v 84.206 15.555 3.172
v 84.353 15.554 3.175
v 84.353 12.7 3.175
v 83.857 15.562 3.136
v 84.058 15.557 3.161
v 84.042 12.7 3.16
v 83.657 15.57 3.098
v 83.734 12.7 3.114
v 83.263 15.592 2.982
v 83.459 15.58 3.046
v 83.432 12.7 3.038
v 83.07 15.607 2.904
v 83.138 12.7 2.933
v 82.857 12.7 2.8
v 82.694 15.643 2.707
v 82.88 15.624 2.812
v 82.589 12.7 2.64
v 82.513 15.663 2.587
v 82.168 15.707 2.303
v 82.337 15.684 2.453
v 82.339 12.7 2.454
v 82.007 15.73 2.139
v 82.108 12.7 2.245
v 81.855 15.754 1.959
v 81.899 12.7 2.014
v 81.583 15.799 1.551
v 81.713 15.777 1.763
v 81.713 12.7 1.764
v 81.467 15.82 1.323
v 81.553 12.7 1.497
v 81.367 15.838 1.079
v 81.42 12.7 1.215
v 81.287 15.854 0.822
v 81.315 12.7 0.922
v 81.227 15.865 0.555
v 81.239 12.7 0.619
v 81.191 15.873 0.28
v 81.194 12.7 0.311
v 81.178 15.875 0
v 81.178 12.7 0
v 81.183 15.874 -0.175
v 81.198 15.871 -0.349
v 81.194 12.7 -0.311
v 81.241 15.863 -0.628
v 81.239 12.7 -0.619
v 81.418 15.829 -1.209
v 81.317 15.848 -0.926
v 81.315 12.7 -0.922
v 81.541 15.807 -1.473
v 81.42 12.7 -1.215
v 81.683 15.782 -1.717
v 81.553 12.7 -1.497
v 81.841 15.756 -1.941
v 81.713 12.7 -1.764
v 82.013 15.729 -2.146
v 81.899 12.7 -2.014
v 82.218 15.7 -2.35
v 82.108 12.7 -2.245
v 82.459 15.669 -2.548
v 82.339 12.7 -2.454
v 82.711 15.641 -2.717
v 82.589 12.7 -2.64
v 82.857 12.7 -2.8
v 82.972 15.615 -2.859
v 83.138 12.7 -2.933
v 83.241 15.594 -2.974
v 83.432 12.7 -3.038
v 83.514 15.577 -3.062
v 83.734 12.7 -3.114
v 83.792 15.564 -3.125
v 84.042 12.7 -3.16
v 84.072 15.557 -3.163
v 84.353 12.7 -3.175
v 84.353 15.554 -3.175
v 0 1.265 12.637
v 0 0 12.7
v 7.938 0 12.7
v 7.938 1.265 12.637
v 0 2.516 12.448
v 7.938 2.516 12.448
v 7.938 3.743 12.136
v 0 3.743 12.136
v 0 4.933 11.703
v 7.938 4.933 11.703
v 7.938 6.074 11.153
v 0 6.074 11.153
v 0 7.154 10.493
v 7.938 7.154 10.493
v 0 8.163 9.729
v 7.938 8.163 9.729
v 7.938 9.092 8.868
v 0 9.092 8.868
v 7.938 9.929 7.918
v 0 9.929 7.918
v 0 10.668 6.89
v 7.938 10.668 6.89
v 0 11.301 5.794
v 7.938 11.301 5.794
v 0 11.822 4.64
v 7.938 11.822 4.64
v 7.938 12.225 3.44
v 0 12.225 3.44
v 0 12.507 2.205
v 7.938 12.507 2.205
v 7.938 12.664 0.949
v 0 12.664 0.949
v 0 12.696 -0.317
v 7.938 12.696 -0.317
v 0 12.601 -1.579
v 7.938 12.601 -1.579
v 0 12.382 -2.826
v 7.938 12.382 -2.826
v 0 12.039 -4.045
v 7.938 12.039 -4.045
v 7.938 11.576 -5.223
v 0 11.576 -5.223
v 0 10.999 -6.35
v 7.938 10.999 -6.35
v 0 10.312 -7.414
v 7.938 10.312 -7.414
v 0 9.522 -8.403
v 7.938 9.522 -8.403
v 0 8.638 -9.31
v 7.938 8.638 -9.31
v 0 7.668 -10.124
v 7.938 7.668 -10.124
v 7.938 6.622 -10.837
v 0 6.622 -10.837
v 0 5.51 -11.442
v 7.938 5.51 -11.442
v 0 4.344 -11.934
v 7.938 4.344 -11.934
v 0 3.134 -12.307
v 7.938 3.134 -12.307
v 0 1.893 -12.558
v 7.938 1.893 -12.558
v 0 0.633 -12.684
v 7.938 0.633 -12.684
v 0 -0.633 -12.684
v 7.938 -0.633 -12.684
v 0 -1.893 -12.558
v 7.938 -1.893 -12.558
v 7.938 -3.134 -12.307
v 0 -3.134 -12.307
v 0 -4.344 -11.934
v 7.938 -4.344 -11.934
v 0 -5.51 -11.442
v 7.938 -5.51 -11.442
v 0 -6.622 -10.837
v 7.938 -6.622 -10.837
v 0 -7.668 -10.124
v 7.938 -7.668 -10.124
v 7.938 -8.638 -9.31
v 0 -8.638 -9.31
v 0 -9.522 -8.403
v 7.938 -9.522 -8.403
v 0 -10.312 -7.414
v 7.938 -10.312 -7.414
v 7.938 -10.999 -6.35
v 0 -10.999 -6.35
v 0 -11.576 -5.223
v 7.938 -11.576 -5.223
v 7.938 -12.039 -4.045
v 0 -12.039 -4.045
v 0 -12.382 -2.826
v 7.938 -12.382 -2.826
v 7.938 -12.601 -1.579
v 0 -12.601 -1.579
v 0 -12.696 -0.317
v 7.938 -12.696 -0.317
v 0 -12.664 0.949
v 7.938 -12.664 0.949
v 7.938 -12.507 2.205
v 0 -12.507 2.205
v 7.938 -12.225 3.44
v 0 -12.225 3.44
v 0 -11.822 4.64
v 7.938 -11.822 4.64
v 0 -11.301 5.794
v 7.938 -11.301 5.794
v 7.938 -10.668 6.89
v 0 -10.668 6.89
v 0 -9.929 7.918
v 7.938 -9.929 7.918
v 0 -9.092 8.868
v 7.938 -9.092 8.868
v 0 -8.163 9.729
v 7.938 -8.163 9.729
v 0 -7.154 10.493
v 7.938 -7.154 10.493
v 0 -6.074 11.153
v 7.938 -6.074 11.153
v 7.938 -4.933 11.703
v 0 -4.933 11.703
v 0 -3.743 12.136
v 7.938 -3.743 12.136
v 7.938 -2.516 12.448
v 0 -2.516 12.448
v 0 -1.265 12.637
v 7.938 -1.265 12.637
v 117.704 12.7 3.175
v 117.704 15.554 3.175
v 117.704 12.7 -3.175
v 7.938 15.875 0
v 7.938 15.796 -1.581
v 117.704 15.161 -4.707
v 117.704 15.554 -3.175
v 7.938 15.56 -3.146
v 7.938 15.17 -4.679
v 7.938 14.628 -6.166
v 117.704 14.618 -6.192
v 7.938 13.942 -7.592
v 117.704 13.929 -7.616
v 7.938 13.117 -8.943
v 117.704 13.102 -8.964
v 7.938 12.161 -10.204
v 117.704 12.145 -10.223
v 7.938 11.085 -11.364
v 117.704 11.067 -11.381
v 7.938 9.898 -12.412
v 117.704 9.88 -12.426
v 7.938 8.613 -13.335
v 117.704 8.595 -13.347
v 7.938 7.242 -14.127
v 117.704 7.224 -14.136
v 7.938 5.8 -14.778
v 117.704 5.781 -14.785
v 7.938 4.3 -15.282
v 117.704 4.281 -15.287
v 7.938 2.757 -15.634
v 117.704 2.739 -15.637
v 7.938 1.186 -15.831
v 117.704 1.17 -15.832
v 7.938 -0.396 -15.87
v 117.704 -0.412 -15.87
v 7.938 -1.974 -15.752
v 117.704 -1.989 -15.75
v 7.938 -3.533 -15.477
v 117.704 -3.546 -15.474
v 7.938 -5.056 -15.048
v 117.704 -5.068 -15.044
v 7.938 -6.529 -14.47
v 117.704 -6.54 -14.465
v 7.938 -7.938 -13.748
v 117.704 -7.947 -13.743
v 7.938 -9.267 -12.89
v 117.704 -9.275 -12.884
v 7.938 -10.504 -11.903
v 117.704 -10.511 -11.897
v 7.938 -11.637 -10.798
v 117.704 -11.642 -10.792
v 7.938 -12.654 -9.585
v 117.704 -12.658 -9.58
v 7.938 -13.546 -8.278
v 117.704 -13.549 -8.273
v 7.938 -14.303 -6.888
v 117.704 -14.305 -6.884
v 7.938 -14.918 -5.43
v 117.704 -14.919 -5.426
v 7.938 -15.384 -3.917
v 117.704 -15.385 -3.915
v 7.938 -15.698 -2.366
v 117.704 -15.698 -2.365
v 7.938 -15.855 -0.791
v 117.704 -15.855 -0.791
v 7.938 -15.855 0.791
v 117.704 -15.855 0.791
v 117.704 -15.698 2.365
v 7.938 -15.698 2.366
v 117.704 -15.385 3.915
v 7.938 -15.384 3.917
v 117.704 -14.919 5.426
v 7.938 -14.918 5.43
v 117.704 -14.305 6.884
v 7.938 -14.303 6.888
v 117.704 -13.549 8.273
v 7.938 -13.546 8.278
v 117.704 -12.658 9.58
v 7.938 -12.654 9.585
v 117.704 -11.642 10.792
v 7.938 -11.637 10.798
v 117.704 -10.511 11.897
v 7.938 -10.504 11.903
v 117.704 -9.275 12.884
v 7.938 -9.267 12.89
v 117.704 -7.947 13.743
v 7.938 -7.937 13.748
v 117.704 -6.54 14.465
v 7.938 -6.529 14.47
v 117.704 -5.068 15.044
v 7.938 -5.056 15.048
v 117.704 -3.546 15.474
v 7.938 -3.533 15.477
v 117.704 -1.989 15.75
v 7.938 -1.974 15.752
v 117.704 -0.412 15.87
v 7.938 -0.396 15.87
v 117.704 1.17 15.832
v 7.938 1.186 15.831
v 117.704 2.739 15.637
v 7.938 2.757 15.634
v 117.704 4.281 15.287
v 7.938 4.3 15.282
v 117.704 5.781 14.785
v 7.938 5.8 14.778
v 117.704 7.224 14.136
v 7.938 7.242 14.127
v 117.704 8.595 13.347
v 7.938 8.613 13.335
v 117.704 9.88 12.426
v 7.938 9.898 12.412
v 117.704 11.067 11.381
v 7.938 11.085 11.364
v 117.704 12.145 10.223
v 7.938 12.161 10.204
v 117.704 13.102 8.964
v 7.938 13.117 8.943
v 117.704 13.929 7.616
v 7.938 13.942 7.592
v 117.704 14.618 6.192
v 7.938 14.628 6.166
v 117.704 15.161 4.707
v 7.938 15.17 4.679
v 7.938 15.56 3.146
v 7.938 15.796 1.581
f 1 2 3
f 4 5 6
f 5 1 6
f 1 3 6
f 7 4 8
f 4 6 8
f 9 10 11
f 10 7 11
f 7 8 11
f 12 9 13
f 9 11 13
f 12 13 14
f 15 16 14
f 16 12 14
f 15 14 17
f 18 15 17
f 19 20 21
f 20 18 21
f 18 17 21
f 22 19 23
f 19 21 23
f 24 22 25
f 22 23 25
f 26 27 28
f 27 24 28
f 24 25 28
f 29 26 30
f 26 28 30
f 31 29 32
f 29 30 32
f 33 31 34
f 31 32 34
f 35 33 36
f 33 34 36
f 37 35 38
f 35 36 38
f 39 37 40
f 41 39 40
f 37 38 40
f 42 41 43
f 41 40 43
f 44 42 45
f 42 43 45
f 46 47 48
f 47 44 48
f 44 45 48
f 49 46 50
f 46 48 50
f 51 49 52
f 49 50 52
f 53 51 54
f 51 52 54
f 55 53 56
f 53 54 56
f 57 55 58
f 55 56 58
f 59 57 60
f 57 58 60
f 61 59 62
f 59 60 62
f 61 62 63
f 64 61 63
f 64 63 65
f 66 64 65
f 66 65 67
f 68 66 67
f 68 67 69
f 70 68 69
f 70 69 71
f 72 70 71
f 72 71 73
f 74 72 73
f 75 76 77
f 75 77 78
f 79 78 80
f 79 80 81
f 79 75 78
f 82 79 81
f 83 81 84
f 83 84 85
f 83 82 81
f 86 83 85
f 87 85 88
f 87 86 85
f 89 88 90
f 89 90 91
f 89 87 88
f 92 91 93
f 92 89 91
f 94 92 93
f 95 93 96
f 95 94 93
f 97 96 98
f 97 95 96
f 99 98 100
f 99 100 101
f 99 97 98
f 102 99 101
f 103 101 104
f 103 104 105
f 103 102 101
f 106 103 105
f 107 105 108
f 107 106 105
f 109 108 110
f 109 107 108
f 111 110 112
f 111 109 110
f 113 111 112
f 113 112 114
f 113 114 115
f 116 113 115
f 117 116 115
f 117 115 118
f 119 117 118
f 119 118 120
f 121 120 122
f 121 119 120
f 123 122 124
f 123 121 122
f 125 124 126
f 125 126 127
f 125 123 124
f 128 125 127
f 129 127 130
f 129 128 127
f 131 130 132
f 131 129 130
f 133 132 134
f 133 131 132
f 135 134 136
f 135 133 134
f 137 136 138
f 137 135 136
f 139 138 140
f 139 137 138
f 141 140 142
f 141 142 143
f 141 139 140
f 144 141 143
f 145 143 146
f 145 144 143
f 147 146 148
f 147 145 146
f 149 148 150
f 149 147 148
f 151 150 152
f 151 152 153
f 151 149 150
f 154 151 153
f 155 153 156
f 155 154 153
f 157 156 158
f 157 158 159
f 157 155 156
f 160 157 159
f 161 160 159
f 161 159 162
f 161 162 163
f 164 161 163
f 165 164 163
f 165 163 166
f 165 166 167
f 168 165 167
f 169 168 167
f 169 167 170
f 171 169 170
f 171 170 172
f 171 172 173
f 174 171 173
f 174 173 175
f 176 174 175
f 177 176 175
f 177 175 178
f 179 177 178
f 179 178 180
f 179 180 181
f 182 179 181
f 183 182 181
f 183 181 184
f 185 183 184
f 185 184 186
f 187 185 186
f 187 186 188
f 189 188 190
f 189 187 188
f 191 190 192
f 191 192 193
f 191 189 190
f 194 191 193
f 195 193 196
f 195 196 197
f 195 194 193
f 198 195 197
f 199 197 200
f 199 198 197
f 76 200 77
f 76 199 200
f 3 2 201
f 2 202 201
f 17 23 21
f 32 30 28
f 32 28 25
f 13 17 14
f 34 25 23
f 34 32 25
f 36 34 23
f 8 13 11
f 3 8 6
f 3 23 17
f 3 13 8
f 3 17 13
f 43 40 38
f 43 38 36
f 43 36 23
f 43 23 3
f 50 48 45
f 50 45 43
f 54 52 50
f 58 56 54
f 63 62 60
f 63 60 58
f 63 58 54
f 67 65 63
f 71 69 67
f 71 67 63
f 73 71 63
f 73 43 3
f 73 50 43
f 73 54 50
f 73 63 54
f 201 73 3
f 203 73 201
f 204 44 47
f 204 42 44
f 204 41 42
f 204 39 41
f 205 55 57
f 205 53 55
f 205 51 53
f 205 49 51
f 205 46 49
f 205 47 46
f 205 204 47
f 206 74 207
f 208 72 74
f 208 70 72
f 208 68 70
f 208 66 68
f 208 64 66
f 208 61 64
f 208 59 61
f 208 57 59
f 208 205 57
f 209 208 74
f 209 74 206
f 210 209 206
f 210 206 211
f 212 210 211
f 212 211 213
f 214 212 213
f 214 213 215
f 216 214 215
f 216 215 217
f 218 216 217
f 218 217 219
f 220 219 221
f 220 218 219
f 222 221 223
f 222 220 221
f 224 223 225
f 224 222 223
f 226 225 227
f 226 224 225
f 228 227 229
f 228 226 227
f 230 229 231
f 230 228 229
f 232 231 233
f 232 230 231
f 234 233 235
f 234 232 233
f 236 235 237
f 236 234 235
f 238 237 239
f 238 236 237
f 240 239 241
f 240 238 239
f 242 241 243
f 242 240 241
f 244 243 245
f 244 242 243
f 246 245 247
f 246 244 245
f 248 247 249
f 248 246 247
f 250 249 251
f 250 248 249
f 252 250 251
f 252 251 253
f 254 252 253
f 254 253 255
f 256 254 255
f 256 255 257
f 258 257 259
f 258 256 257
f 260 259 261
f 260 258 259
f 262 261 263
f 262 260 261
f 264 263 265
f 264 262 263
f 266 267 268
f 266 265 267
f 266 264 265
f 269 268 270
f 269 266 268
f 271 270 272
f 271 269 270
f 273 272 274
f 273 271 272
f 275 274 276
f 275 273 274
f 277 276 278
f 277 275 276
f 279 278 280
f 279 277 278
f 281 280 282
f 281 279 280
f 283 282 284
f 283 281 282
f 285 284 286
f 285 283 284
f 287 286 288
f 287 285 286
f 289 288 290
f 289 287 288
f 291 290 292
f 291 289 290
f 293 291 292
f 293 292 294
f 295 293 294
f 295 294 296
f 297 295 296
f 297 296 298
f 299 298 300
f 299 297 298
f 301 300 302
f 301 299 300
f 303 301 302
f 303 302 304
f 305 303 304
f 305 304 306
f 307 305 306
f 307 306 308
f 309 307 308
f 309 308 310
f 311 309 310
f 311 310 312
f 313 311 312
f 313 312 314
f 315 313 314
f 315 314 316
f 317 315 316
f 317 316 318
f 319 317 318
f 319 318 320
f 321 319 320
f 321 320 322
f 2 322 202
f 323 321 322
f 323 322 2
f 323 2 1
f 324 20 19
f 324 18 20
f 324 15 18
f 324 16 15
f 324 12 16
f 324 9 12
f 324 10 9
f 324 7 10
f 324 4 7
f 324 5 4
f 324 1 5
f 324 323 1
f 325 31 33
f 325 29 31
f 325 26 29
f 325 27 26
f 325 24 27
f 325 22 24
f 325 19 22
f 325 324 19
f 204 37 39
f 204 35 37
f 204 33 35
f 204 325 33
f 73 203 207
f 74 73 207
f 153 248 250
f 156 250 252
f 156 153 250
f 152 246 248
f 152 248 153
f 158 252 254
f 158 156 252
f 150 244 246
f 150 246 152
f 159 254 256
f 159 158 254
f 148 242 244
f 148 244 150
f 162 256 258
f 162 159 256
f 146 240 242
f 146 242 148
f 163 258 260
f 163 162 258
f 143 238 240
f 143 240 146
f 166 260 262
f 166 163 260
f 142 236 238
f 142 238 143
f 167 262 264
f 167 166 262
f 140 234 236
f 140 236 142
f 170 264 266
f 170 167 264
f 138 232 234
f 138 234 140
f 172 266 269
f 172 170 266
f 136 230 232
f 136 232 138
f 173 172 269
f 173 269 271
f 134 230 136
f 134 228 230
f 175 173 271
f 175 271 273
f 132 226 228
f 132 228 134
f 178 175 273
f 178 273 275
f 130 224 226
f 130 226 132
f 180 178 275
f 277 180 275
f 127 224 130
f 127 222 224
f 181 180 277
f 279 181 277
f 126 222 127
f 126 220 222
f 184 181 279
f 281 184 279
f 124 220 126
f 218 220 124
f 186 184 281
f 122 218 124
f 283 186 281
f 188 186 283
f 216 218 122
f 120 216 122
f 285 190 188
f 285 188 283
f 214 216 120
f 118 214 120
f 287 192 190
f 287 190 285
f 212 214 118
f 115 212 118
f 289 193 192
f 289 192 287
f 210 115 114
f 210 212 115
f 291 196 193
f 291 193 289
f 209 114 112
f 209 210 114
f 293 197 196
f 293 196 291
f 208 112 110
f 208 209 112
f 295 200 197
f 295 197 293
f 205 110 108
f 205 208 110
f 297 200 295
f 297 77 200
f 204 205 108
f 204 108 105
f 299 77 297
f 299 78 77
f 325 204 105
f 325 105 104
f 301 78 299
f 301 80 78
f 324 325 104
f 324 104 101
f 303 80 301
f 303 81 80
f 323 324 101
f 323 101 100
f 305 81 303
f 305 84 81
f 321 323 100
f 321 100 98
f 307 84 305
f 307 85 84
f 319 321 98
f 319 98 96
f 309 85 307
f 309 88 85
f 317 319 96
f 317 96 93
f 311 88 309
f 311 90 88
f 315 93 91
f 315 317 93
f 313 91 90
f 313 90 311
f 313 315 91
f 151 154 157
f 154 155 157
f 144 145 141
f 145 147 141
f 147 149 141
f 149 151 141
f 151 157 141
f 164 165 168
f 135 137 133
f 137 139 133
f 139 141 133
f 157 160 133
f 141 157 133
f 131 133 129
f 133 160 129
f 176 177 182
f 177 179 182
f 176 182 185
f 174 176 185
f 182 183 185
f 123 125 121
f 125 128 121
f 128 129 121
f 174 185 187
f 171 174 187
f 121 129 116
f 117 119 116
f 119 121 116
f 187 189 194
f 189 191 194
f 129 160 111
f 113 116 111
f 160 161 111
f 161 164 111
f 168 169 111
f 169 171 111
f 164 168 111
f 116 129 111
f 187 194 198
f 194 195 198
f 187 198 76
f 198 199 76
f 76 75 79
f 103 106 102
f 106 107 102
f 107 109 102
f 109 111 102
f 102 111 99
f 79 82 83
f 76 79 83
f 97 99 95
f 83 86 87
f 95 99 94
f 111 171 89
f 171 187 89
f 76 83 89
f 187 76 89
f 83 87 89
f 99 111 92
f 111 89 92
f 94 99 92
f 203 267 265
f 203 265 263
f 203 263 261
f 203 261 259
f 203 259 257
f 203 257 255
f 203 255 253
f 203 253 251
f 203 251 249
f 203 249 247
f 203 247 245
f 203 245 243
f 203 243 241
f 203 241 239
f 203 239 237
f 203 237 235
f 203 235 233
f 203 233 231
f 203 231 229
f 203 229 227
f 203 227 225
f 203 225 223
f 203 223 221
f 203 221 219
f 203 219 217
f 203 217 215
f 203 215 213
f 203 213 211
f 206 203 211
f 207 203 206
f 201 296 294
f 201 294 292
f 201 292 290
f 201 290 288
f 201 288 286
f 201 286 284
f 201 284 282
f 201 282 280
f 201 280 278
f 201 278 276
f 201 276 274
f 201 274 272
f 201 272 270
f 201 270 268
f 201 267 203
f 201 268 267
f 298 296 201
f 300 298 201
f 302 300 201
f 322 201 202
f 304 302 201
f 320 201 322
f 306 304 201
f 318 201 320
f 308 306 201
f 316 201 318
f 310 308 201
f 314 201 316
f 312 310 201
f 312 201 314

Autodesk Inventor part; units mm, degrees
ref_plane "YZ Plane" through (0, 0, 0) normal (1, 0, 0) x (0, 1, 0)
ref_plane "XZ Plane" through (0, 0, 0) normal (0, 1, 0) x (-1, 0, 0)
ref_plane "XY Plane" through (0, 0, 0) normal (0, 0, 1) x (1, 0, 0)
sketch "Sketch1" plane through (0, 0, 0) normal (1, 0, 0) x (0, 1, 0)
  circle A0 centre (0, 0) radius 15.875
  dimension "d0" = 31.75
extrude "Extrusion1" add sketch "Sketch1" along normal blind 117.7036
ref_plane "Work Plane1" through (65.5447, 0, 0) normal (1, 0, 0) x (0, 0, -1)
sketch "Sketch9" plane through (117.7036, 0, 0) normal (1, 0, 0) x (0, 0, -1)
  line L0 (-3.175, 15.875) -> (-3.175, 12.7)
  line L1 (-3.175, 12.7) -> (3.175, 12.7)
  line L2 (3.175, 12.7) -> (3.175, 15.875)
  line L3 (0, 0) -> (0, 19.977)
  circle A0 centre (0, 0) radius 15.875 projected
  line L4 (0, 15.875) -> (-16.159, 15.875)
  point P0 (0, 12.7)
  point P1 (3.175, 15.5543)
  point P2 (-3.175, 15.5543)
  dimension "d26" = 6.35
  dimension "d27" = 3.175
extrude "Extrusion9" cut sketch "Sketch9" against normal blind 33.3502 contours A0 L3 L1 L0 | A0 L2 L1 L3
sketch "Sketch10" plane through (0, 0, 0) normal (-1, 0, 0) x (0, 0, 1)
  circle A0 centre (0, 0) radius 15.875
  circle A1 centre (0, 0) radius 12.7
  dimension "d30" = 25.4
extrude "Extrusion10" cut sketch "Sketch10" against normal blind 7.9375
sketch "Sketch11" plane through (117.7036, 12.7, 3.175) normal (0, 1, 0) x (1, 0, 0)
  line L0 (0, 0) -> (-33.3502, 0) projected
  line L1 (-33.3502, 6.35) -> (0, 6.35) projected
  line L2 (-33.3502, 6.35) -> (-33.3502, 0) projected
  arc A0 (-36.4412, 5.0705) -> (-33.3502, 0) centre (-39.0546, 0) ccw
  circle A1 centre (-33.3502, 3.175) radius 3.175
  point P0 (-117.7036, 3.175)
extrude "Extrusion11" cut sketch "Sketch11" along normal blind 25.4
properties part number "DTR-3"
